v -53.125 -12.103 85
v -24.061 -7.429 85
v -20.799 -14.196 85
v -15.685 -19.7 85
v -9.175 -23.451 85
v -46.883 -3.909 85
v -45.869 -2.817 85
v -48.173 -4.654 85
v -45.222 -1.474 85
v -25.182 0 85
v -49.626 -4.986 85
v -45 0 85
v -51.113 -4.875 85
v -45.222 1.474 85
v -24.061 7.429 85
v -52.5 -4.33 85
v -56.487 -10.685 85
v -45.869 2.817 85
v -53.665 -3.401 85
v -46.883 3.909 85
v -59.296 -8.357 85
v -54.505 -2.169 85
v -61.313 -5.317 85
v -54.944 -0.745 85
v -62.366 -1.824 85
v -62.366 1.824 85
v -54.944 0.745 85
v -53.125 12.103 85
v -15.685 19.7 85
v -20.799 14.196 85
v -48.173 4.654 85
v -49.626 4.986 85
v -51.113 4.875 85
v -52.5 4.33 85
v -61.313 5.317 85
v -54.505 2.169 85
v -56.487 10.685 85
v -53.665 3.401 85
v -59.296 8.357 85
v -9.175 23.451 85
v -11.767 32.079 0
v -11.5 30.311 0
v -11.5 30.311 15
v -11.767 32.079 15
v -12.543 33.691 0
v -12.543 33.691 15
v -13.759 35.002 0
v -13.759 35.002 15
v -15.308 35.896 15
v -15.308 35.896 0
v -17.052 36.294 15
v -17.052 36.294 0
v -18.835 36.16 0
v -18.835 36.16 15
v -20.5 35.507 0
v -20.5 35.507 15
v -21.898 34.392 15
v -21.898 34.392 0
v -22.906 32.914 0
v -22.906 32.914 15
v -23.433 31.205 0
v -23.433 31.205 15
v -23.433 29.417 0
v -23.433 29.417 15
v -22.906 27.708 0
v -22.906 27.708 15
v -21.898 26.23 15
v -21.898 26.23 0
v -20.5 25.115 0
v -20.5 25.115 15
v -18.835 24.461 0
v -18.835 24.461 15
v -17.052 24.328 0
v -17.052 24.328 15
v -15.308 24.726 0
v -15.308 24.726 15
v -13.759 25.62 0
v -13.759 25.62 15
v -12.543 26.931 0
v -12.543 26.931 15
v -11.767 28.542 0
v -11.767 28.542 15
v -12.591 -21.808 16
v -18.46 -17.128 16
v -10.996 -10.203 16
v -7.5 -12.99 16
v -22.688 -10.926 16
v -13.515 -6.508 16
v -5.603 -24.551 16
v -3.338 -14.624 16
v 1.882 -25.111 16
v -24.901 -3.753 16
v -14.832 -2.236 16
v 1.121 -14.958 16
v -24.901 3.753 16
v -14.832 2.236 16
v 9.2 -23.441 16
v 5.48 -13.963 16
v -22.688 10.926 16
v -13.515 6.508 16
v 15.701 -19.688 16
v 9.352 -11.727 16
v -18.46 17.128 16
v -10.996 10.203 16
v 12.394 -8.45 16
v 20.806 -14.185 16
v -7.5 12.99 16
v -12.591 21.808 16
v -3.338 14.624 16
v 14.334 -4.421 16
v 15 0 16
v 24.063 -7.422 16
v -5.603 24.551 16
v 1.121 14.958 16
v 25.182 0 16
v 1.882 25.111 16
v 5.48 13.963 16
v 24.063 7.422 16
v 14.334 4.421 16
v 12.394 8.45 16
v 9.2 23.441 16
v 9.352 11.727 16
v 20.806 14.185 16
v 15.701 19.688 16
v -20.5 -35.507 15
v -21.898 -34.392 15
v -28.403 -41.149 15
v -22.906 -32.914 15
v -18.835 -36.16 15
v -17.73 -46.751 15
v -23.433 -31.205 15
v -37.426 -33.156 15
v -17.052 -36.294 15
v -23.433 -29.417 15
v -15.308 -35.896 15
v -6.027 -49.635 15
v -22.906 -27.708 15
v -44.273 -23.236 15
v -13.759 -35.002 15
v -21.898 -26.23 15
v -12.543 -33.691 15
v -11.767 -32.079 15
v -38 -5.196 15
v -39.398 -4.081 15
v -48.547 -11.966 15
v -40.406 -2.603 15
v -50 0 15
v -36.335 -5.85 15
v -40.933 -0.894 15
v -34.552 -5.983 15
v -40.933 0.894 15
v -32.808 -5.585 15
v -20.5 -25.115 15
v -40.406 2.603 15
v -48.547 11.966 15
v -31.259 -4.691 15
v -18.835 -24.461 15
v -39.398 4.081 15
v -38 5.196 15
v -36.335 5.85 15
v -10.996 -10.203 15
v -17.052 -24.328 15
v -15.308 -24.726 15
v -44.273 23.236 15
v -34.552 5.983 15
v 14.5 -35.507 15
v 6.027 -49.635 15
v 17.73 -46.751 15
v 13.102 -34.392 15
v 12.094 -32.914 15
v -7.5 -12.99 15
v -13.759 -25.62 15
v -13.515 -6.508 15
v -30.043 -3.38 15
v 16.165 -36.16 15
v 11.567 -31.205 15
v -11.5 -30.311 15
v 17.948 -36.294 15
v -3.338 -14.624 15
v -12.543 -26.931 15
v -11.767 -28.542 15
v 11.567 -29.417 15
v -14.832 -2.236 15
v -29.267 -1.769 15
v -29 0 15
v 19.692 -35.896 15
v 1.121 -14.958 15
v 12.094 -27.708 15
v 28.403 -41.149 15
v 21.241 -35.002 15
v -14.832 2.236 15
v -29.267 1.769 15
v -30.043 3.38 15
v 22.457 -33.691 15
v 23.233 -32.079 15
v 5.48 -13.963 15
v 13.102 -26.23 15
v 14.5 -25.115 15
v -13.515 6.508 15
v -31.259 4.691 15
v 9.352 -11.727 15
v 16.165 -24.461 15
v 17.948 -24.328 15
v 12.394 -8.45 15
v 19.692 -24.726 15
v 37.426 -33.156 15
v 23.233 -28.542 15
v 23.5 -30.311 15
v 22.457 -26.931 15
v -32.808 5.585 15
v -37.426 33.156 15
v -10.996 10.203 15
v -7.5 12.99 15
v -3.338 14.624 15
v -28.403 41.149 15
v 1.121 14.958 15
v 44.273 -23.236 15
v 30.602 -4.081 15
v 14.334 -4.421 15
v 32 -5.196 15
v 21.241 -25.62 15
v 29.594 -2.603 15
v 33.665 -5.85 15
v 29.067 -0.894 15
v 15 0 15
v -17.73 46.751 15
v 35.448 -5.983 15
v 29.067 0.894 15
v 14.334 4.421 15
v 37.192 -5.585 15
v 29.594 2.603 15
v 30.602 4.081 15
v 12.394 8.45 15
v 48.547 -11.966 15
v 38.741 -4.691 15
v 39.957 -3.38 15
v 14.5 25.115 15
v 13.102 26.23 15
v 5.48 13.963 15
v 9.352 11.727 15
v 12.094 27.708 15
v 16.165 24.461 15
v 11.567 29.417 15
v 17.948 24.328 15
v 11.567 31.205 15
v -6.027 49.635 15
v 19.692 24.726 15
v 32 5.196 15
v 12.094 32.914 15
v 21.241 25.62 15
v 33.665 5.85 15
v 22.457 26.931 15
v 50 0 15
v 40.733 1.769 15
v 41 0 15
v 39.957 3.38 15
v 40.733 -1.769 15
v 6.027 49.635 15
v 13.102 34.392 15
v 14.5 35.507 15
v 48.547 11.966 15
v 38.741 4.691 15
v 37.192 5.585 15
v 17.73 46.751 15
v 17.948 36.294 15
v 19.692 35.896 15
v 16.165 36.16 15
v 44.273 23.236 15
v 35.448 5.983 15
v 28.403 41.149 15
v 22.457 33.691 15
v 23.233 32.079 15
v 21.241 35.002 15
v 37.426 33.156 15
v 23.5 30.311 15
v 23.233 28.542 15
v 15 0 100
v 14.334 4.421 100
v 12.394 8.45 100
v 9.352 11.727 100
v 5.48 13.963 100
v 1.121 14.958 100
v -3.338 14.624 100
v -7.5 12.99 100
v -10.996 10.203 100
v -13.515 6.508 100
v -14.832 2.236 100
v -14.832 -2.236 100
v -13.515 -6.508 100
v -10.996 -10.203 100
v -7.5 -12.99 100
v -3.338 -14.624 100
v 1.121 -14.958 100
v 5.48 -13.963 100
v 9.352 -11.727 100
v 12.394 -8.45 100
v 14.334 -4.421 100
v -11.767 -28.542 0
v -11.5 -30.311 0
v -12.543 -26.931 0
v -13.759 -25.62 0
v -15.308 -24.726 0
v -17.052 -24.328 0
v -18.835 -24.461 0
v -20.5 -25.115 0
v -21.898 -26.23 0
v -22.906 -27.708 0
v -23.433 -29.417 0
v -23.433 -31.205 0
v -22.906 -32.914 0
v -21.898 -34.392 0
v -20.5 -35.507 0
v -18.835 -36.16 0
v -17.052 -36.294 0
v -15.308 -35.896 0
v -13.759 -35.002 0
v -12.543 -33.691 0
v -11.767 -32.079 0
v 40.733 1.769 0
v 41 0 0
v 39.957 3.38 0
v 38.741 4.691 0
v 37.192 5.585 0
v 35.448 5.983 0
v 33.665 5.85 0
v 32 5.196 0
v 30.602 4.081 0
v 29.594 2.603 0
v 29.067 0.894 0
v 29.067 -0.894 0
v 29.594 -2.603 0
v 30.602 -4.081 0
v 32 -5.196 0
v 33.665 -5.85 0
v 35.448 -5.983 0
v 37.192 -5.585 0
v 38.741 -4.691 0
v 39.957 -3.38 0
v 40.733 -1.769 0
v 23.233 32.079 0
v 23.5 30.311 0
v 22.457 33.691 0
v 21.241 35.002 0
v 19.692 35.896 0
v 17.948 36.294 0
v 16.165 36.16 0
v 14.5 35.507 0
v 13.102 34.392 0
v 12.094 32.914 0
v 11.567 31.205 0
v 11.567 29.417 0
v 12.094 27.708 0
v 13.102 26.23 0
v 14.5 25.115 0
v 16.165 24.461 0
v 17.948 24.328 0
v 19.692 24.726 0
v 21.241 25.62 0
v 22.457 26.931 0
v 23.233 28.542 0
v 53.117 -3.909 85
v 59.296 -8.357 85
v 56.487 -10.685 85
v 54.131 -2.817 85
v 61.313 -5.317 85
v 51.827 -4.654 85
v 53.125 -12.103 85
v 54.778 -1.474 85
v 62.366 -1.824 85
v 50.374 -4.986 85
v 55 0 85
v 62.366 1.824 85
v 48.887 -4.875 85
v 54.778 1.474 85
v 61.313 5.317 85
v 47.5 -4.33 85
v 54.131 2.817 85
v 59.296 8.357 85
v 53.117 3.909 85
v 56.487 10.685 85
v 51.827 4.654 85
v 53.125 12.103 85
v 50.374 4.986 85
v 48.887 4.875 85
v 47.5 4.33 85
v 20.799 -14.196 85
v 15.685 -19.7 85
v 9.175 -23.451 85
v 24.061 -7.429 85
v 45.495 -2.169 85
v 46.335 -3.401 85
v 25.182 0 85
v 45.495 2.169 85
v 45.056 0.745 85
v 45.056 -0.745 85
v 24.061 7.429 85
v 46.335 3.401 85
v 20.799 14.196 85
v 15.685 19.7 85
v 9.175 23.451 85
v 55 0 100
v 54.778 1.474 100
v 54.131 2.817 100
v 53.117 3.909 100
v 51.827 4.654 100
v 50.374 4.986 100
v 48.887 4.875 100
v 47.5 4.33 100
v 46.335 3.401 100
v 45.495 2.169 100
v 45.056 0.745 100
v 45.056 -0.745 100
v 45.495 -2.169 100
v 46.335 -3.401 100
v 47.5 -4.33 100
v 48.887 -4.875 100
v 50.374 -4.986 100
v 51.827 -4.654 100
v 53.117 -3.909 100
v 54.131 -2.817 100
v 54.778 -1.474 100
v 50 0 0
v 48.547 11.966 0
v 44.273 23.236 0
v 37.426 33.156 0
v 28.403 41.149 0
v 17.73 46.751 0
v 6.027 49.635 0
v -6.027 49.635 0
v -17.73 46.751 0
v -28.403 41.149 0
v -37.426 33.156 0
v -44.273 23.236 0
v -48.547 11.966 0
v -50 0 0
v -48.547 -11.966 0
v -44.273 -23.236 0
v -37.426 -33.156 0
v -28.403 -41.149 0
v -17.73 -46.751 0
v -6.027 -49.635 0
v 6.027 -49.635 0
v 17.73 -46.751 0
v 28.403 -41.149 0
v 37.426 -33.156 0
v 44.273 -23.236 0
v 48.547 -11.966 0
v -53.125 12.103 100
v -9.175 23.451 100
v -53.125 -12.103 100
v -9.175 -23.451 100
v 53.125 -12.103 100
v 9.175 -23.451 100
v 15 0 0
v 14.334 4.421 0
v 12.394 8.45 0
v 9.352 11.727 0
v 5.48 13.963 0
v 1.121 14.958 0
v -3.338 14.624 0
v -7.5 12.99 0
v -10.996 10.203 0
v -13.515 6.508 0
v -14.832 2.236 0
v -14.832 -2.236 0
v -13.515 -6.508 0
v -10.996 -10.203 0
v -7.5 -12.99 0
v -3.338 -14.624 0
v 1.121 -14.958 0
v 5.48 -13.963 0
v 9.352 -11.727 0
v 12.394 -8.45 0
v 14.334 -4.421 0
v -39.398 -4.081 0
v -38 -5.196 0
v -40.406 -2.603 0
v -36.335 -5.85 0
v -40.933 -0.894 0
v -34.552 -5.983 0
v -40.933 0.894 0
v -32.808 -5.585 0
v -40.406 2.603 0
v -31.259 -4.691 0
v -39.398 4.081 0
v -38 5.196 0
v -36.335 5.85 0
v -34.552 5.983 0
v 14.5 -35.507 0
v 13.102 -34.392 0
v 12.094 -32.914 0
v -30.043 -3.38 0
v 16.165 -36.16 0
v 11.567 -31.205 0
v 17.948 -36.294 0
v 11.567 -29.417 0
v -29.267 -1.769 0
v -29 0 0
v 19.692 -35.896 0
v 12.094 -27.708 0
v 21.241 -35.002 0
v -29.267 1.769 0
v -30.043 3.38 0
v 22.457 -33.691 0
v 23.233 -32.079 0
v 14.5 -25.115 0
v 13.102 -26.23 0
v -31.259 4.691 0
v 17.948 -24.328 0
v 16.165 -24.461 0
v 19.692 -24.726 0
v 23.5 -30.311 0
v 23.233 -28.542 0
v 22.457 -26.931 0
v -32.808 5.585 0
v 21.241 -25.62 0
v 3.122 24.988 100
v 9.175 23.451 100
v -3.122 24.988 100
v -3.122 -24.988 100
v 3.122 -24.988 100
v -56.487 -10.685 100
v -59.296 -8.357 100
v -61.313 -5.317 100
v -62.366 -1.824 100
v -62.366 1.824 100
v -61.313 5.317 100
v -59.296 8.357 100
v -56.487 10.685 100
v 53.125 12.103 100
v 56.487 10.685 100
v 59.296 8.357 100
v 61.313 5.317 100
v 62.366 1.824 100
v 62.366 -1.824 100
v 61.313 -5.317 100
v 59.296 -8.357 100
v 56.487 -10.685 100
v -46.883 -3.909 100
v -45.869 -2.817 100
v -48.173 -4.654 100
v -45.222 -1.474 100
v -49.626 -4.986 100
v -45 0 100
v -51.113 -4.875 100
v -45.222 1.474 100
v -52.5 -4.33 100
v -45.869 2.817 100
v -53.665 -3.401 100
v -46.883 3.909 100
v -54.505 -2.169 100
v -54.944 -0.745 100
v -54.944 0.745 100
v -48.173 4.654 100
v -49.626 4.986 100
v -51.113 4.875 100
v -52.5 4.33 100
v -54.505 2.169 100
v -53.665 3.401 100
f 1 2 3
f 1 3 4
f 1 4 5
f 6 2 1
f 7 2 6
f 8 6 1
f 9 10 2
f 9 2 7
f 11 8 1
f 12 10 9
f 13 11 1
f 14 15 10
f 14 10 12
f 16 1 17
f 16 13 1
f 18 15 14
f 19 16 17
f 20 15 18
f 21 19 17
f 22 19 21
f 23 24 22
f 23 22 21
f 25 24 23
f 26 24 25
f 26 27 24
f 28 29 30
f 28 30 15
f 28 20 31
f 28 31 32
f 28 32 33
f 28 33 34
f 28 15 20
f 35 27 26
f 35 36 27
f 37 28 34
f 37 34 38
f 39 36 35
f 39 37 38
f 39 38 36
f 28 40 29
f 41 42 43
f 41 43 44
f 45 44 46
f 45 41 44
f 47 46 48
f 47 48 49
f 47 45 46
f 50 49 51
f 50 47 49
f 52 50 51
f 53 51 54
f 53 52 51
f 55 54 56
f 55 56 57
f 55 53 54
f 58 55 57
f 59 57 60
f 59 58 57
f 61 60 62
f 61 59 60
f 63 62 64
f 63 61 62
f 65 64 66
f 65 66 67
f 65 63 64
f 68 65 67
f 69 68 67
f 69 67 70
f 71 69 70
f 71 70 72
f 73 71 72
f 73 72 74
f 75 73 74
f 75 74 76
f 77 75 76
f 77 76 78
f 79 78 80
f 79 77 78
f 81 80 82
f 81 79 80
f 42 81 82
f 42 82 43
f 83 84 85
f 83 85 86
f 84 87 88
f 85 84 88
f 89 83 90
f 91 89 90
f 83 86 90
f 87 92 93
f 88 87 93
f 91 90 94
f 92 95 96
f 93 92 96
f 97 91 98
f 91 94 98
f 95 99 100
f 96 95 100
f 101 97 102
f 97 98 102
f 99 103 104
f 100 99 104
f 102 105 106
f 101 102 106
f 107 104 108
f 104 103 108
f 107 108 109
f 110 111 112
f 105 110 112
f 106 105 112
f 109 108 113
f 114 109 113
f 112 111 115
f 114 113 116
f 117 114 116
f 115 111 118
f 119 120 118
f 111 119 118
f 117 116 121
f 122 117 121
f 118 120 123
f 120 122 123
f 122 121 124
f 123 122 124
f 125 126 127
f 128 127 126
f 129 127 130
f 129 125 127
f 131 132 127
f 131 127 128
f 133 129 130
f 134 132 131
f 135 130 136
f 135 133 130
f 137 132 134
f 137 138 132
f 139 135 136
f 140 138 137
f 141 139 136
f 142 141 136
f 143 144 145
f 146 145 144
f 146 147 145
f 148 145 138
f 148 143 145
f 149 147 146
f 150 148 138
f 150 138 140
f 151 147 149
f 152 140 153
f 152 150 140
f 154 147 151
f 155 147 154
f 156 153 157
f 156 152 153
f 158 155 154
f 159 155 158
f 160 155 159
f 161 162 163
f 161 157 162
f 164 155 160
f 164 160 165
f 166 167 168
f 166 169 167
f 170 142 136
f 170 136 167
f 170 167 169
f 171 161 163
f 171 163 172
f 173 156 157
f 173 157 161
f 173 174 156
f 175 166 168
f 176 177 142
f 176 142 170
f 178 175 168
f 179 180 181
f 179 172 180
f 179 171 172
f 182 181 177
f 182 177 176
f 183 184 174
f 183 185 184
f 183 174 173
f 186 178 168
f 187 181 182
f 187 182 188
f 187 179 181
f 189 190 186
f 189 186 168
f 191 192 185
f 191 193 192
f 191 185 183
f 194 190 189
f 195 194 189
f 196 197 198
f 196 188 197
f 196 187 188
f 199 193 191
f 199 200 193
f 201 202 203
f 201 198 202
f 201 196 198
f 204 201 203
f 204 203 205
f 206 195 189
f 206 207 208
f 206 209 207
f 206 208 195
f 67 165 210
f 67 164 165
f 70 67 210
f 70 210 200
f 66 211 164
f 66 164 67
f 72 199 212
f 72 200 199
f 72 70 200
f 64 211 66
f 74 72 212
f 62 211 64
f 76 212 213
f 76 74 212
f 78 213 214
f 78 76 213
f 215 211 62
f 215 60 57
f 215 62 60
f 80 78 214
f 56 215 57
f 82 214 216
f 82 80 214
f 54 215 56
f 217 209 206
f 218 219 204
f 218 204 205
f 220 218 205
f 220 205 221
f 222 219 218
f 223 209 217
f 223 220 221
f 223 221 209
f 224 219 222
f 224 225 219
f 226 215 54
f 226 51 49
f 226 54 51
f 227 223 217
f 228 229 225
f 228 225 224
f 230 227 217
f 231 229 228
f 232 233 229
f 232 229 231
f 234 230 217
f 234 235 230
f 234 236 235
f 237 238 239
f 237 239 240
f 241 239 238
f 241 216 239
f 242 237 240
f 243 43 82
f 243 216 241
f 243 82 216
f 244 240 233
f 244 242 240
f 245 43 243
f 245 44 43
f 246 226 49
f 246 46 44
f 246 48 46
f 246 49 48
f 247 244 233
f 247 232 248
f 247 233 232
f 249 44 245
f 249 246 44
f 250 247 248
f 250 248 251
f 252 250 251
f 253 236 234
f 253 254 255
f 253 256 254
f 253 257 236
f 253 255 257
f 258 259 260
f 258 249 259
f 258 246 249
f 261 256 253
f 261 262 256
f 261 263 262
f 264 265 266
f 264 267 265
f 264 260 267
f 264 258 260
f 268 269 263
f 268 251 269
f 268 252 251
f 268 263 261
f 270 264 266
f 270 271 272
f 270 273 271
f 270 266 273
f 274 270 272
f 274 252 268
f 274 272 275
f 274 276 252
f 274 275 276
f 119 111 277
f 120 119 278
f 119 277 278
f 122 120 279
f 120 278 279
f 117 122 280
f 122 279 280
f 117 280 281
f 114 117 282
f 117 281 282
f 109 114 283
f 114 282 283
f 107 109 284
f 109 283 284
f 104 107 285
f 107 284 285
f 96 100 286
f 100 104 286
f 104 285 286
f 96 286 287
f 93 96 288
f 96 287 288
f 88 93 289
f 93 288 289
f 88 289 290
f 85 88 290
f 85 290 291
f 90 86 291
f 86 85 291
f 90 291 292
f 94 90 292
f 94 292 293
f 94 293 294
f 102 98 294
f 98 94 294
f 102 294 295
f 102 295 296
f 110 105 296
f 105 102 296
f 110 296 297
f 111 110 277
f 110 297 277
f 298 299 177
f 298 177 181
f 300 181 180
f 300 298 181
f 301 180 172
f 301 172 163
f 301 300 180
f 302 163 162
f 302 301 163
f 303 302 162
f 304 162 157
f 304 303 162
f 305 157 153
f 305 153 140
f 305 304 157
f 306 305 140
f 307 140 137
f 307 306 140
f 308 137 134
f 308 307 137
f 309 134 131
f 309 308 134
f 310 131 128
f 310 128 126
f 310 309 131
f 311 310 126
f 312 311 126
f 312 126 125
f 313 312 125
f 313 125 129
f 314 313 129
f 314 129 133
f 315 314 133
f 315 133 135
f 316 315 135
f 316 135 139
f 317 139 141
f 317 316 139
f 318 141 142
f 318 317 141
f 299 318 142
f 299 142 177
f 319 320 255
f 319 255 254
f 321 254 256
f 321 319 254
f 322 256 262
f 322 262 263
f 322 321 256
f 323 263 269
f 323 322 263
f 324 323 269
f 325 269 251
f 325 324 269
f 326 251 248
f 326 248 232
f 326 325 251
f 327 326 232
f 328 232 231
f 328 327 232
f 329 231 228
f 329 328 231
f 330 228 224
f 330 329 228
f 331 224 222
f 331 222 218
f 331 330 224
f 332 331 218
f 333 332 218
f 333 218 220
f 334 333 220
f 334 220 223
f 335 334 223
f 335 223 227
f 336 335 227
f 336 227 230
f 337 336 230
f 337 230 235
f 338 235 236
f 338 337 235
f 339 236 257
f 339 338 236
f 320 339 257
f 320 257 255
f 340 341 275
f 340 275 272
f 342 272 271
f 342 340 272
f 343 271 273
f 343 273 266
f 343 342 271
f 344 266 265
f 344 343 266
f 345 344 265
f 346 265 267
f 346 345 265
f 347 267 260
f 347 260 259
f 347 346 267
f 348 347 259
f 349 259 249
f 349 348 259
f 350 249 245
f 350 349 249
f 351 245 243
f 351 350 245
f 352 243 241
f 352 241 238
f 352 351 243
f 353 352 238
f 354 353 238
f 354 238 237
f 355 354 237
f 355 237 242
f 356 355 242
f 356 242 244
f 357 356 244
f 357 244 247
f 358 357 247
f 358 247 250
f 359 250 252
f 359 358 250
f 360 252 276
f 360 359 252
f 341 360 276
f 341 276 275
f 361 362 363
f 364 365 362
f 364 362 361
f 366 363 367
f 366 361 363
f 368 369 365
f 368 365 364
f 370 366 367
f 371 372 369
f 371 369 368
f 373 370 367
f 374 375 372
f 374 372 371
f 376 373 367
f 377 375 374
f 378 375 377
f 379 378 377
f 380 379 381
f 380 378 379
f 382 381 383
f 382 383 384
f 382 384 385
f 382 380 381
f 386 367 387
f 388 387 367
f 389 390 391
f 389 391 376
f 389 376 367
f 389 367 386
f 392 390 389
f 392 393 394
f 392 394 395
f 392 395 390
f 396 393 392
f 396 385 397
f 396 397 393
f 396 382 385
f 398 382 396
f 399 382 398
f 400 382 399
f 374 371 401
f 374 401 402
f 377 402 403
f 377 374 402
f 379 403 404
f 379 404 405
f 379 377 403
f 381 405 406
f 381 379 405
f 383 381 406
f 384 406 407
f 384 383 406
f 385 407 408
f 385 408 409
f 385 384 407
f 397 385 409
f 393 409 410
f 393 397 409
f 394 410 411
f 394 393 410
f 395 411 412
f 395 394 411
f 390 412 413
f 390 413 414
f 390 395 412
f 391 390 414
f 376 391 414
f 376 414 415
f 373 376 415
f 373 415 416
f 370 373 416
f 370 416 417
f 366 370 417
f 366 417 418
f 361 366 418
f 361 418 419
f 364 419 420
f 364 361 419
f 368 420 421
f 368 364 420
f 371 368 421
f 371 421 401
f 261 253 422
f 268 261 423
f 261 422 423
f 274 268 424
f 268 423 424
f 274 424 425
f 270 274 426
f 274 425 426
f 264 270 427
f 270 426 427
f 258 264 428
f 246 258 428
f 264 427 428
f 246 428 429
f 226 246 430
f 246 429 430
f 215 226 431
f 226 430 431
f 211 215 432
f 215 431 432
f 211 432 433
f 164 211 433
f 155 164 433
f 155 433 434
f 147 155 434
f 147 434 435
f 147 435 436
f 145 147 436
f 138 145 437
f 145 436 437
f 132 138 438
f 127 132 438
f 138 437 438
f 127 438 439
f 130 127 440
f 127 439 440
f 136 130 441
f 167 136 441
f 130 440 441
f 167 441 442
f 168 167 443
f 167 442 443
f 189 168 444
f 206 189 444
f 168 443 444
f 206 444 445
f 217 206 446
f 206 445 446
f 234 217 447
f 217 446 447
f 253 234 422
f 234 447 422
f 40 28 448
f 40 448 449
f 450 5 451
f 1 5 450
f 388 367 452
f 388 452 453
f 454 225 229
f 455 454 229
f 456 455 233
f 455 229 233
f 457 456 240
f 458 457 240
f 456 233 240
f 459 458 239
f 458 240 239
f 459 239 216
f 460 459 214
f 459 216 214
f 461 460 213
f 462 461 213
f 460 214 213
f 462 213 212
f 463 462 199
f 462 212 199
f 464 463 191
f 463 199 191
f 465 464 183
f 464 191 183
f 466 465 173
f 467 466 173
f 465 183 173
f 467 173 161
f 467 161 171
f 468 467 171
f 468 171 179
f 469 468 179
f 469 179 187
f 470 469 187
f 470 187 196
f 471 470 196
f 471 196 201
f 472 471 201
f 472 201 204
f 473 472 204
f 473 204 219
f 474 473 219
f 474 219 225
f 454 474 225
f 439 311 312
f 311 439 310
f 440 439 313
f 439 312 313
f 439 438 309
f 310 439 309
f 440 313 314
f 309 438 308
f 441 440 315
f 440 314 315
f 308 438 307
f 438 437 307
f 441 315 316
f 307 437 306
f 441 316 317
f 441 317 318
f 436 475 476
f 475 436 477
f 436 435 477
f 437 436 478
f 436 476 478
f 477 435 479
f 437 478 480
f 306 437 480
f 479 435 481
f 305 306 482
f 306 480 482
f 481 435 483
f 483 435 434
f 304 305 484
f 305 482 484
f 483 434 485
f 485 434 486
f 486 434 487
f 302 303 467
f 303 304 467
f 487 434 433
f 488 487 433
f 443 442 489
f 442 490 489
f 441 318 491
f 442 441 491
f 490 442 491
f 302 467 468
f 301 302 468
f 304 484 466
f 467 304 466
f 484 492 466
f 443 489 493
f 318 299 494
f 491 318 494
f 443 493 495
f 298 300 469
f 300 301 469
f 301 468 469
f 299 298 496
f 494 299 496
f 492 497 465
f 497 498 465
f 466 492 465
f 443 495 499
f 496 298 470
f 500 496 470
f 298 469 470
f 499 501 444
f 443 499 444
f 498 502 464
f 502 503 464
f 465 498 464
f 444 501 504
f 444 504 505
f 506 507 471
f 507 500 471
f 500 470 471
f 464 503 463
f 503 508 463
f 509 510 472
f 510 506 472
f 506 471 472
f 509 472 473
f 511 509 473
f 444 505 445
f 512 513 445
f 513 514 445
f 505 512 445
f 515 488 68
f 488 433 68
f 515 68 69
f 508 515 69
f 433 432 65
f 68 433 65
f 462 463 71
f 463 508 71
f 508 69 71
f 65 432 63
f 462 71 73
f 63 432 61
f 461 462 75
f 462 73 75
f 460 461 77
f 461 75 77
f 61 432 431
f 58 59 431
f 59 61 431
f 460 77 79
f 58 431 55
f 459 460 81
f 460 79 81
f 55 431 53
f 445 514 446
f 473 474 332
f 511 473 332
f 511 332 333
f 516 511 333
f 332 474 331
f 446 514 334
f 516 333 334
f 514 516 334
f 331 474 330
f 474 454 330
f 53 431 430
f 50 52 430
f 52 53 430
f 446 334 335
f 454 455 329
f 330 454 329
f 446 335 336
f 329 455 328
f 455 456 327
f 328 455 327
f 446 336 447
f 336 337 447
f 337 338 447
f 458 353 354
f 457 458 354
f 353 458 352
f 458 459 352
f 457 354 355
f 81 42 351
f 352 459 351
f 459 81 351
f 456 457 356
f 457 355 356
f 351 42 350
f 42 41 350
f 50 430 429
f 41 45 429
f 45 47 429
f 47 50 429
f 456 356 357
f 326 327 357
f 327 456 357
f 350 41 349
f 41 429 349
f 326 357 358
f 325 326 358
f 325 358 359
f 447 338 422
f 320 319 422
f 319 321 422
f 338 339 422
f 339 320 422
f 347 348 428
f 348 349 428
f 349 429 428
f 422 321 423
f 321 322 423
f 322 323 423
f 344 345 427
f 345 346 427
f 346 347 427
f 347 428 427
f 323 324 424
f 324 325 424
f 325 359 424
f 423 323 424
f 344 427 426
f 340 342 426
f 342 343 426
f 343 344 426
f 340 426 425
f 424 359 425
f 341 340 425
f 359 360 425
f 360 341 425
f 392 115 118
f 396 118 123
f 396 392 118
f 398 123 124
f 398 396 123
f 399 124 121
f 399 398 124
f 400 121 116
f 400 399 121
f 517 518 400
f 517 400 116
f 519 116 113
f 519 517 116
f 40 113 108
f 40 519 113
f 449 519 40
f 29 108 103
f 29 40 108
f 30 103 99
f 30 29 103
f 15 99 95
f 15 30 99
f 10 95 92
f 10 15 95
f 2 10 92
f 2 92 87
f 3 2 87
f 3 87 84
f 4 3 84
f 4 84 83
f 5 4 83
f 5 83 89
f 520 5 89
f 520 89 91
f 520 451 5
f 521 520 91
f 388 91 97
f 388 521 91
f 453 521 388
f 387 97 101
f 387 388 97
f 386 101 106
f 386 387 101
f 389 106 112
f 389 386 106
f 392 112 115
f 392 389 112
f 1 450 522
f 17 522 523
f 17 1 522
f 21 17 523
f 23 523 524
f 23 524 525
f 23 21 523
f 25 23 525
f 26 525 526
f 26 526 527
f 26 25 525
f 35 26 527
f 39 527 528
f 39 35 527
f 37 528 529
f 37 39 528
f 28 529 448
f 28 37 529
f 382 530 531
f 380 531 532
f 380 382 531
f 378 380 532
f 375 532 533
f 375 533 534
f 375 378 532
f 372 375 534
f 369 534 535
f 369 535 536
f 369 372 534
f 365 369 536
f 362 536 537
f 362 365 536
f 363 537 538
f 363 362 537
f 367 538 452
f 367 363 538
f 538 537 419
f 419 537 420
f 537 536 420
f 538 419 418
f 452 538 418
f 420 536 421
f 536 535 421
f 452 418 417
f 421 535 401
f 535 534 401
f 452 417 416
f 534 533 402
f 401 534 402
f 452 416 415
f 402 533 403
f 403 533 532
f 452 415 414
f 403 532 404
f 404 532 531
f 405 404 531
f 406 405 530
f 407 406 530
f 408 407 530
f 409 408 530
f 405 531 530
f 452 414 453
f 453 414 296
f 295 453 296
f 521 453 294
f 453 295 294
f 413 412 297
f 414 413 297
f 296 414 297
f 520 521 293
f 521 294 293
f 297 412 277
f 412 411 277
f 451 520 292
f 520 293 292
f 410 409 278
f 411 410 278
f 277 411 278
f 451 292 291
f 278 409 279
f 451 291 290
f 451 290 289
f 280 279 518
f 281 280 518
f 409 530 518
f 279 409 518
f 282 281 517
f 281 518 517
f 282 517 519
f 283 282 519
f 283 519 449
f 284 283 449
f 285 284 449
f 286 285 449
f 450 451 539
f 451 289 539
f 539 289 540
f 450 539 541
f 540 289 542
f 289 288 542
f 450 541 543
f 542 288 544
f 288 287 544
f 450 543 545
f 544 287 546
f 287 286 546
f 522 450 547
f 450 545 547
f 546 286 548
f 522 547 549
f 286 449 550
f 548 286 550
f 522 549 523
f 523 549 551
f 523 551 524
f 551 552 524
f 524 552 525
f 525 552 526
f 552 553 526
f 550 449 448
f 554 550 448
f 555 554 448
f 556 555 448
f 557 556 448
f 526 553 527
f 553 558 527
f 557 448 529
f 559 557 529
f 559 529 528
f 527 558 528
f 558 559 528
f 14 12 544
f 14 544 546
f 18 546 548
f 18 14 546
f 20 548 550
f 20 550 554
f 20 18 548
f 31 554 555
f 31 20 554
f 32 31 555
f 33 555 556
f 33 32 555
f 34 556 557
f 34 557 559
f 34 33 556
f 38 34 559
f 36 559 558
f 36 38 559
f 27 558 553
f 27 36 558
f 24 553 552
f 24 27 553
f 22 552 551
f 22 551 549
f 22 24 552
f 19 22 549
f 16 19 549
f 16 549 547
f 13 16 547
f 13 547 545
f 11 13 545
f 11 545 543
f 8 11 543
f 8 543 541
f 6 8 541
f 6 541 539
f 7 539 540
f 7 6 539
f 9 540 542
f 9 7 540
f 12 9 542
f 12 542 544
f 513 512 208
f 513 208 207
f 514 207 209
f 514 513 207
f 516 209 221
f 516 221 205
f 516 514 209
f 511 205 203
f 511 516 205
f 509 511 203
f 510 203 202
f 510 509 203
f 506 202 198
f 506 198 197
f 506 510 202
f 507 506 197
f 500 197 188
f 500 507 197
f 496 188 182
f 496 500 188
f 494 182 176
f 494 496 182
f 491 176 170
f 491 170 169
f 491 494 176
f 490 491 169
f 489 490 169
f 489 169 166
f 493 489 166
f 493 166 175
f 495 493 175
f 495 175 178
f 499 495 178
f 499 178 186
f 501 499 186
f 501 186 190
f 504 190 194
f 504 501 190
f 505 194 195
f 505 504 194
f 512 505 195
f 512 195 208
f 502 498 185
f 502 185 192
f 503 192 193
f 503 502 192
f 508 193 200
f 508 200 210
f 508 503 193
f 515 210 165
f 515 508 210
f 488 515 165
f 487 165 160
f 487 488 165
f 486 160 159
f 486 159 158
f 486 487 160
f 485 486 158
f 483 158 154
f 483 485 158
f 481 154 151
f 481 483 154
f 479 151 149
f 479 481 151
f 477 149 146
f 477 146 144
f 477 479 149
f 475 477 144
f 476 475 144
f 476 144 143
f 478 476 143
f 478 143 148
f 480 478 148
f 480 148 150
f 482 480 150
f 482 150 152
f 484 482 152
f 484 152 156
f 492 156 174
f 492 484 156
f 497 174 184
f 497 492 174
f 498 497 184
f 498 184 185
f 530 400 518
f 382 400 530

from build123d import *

# Parameters (mm, degrees)
SKETCH1_R           = 50
SKETCH1_R_2         = 6
SKETCH1_R_3         = 15
BOSS_EXTRUDE1_DEPTH = 15
SKETCH1_3_R         = 15
BOSS_EXTRUDE2_DEPTH = 85
SKETCH2_R           = 15
SKETCH2_R_2         = 5
BOSS_EXTRUDE3_DEPTH = 15
SKETCH3_R           = 25.181893643
BOSS_EXTRUDE4_DEPTH = 84
CUT_EXTRUDE1_START  = -120
SKETCH4_R           = 15
CUT_EXTRUDE1_DEPTH  = 120


with BuildPart() as part:
    # Sketch1 → Boss-Extrude1 (new body)
    with BuildSketch(Plane.XY):
        Circle(SKETCH1_R)
        with Locations((17.5, 30.310889132)):
            Circle(SKETCH1_R_2, mode=Mode.SUBTRACT)
        with Locations((-17.5, 30.310889132)):
            Circle(SKETCH1_R_2, mode=Mode.SUBTRACT)
        with Locations((-35, 0)):
            Circle(SKETCH1_R_2, mode=Mode.SUBTRACT)
        with Locations((-17.5, -30.310889132)):
            Circle(SKETCH1_R_2, mode=Mode.SUBTRACT)
        with Locations((17.5, -30.310889132)):
            Circle(SKETCH1_R_2, mode=Mode.SUBTRACT)
        with Locations((35, 0)):
            Circle(SKETCH1_R_2, mode=Mode.SUBTRACT)
        Circle(SKETCH1_R_3, mode=Mode.SUBTRACT)
    extrude(amount=BOSS_EXTRUDE1_DEPTH)

    # Sketch1<3> → Boss-Extrude2 (add)
    with BuildSketch(Plane.XY):
        Circle(SKETCH1_3_R)
    extrude(amount=BOSS_EXTRUDE2_DEPTH)



with BuildPart() as body_2:
    # Sketch2 → Boss-Extrude3 (new body)
    with BuildSketch(Plane.XY.offset(85)):
        with BuildLine():
            Line((-53.125, 12.103072957), (-6.25, 24.206145914))
            ThreePointArc((-6.25, 24.206145914), (0, 25), (6.25, 24.206145914))
            Line((6.25, 24.206145914), (53.125, 12.103072957))
            ThreePointArc((53.125, 12.103072957), (62.5, 0), (53.125, -12.103072957))
            Line((53.125, -12.103072957), (6.25, -24.206145914))
            ThreePointArc((6.25, -24.206145914), (0, -25), (-6.25, -24.206145914))
            Line((-6.25, -24.206145914), (-53.125, -12.103072957))
            ThreePointArc((-53.125, -12.103072957), (-62.5, 0), (-53.125, 12.103072957))
        make_face()
        Circle(SKETCH2_R, mode=Mode.SUBTRACT)
        with Locations((-50, 0)):
            Circle(SKETCH2_R_2, mode=Mode.SUBTRACT)
        with Locations((50, 0)):
            Circle(SKETCH2_R_2, mode=Mode.SUBTRACT)
    extrude(amount=BOSS_EXTRUDE3_DEPTH)


with BuildPart() as part_1:
    add(part.part)

    add(body_2.part)  # Boss-Extrude4 merges body 2
    # Sketch3 → Boss-Extrude4 (add)
    with BuildSketch(Plane.XY.offset(100)):
        Circle(SKETCH3_R)
    extrude(amount=-BOSS_EXTRUDE4_DEPTH)

    # Sketch4 → Cut-Extrude1 (cut)
    with BuildSketch(Plane.XY.offset(100).offset(CUT_EXTRUDE1_START)):
        Circle(SKETCH4_R)
    extrude(amount=CUT_EXTRUDE1_DEPTH, mode=Mode.SUBTRACT)


with BuildPart() as cut_extrude1_piece_1:
    # of the separate pieces the step leaves, piece 1, a body of its own (cut_extrude1_pieces)
    add(part_1.part.solids().sort_by_distance((25.181893643, 0, 16))[0])


with BuildPart() as cut_extrude1_piece_2:
    # of the separate pieces the step leaves, piece 2, a body of its own (cut_extrude1_pieces)
    add(part_1.part.solids().sort_by_distance((50, 0, 0))[0])


solid = Compound([cut_extrude1_piece_1.part, cut_extrude1_piece_2.part])
